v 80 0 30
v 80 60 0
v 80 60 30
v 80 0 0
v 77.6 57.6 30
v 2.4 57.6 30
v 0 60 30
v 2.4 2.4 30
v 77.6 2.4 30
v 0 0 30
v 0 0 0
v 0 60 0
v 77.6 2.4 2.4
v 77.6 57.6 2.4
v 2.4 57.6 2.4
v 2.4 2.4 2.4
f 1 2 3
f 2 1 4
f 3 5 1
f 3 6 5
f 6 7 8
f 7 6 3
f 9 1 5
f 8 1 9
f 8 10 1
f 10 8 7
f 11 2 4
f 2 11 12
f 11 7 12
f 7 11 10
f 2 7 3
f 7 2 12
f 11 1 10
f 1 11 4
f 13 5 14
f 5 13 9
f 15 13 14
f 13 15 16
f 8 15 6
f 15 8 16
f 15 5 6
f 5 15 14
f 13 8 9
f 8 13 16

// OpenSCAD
// Box with print-in-place hinge - params + box
part = "box";

W = 80; D = 60; Hbox = 30; Hlid = 10; wall = 2.4; floor_t = 2.4;
lid_t = 2.4; skirt_h = 7.6;
pin_r = 2.0; pin_clear = 0.35; knuckle_r = 4.0;
hinge_y = -D/2; hinge_z = 20;
n_knuckle = 5;

cadverify_only = "";
module instance(name, part, unit = 1) {
    echo(cadverify_instance = [name, part, unit]);
    if (cadverify_only == "" || cadverify_only == name) children();
}

module box_part() {
    difference() {
        cube([W, D, Hbox]);
        translate([wall, wall, floor_t])
            cube([W-2*wall, D-2*wall, Hbox]);
    }
}

if (part == "box") box_part();
